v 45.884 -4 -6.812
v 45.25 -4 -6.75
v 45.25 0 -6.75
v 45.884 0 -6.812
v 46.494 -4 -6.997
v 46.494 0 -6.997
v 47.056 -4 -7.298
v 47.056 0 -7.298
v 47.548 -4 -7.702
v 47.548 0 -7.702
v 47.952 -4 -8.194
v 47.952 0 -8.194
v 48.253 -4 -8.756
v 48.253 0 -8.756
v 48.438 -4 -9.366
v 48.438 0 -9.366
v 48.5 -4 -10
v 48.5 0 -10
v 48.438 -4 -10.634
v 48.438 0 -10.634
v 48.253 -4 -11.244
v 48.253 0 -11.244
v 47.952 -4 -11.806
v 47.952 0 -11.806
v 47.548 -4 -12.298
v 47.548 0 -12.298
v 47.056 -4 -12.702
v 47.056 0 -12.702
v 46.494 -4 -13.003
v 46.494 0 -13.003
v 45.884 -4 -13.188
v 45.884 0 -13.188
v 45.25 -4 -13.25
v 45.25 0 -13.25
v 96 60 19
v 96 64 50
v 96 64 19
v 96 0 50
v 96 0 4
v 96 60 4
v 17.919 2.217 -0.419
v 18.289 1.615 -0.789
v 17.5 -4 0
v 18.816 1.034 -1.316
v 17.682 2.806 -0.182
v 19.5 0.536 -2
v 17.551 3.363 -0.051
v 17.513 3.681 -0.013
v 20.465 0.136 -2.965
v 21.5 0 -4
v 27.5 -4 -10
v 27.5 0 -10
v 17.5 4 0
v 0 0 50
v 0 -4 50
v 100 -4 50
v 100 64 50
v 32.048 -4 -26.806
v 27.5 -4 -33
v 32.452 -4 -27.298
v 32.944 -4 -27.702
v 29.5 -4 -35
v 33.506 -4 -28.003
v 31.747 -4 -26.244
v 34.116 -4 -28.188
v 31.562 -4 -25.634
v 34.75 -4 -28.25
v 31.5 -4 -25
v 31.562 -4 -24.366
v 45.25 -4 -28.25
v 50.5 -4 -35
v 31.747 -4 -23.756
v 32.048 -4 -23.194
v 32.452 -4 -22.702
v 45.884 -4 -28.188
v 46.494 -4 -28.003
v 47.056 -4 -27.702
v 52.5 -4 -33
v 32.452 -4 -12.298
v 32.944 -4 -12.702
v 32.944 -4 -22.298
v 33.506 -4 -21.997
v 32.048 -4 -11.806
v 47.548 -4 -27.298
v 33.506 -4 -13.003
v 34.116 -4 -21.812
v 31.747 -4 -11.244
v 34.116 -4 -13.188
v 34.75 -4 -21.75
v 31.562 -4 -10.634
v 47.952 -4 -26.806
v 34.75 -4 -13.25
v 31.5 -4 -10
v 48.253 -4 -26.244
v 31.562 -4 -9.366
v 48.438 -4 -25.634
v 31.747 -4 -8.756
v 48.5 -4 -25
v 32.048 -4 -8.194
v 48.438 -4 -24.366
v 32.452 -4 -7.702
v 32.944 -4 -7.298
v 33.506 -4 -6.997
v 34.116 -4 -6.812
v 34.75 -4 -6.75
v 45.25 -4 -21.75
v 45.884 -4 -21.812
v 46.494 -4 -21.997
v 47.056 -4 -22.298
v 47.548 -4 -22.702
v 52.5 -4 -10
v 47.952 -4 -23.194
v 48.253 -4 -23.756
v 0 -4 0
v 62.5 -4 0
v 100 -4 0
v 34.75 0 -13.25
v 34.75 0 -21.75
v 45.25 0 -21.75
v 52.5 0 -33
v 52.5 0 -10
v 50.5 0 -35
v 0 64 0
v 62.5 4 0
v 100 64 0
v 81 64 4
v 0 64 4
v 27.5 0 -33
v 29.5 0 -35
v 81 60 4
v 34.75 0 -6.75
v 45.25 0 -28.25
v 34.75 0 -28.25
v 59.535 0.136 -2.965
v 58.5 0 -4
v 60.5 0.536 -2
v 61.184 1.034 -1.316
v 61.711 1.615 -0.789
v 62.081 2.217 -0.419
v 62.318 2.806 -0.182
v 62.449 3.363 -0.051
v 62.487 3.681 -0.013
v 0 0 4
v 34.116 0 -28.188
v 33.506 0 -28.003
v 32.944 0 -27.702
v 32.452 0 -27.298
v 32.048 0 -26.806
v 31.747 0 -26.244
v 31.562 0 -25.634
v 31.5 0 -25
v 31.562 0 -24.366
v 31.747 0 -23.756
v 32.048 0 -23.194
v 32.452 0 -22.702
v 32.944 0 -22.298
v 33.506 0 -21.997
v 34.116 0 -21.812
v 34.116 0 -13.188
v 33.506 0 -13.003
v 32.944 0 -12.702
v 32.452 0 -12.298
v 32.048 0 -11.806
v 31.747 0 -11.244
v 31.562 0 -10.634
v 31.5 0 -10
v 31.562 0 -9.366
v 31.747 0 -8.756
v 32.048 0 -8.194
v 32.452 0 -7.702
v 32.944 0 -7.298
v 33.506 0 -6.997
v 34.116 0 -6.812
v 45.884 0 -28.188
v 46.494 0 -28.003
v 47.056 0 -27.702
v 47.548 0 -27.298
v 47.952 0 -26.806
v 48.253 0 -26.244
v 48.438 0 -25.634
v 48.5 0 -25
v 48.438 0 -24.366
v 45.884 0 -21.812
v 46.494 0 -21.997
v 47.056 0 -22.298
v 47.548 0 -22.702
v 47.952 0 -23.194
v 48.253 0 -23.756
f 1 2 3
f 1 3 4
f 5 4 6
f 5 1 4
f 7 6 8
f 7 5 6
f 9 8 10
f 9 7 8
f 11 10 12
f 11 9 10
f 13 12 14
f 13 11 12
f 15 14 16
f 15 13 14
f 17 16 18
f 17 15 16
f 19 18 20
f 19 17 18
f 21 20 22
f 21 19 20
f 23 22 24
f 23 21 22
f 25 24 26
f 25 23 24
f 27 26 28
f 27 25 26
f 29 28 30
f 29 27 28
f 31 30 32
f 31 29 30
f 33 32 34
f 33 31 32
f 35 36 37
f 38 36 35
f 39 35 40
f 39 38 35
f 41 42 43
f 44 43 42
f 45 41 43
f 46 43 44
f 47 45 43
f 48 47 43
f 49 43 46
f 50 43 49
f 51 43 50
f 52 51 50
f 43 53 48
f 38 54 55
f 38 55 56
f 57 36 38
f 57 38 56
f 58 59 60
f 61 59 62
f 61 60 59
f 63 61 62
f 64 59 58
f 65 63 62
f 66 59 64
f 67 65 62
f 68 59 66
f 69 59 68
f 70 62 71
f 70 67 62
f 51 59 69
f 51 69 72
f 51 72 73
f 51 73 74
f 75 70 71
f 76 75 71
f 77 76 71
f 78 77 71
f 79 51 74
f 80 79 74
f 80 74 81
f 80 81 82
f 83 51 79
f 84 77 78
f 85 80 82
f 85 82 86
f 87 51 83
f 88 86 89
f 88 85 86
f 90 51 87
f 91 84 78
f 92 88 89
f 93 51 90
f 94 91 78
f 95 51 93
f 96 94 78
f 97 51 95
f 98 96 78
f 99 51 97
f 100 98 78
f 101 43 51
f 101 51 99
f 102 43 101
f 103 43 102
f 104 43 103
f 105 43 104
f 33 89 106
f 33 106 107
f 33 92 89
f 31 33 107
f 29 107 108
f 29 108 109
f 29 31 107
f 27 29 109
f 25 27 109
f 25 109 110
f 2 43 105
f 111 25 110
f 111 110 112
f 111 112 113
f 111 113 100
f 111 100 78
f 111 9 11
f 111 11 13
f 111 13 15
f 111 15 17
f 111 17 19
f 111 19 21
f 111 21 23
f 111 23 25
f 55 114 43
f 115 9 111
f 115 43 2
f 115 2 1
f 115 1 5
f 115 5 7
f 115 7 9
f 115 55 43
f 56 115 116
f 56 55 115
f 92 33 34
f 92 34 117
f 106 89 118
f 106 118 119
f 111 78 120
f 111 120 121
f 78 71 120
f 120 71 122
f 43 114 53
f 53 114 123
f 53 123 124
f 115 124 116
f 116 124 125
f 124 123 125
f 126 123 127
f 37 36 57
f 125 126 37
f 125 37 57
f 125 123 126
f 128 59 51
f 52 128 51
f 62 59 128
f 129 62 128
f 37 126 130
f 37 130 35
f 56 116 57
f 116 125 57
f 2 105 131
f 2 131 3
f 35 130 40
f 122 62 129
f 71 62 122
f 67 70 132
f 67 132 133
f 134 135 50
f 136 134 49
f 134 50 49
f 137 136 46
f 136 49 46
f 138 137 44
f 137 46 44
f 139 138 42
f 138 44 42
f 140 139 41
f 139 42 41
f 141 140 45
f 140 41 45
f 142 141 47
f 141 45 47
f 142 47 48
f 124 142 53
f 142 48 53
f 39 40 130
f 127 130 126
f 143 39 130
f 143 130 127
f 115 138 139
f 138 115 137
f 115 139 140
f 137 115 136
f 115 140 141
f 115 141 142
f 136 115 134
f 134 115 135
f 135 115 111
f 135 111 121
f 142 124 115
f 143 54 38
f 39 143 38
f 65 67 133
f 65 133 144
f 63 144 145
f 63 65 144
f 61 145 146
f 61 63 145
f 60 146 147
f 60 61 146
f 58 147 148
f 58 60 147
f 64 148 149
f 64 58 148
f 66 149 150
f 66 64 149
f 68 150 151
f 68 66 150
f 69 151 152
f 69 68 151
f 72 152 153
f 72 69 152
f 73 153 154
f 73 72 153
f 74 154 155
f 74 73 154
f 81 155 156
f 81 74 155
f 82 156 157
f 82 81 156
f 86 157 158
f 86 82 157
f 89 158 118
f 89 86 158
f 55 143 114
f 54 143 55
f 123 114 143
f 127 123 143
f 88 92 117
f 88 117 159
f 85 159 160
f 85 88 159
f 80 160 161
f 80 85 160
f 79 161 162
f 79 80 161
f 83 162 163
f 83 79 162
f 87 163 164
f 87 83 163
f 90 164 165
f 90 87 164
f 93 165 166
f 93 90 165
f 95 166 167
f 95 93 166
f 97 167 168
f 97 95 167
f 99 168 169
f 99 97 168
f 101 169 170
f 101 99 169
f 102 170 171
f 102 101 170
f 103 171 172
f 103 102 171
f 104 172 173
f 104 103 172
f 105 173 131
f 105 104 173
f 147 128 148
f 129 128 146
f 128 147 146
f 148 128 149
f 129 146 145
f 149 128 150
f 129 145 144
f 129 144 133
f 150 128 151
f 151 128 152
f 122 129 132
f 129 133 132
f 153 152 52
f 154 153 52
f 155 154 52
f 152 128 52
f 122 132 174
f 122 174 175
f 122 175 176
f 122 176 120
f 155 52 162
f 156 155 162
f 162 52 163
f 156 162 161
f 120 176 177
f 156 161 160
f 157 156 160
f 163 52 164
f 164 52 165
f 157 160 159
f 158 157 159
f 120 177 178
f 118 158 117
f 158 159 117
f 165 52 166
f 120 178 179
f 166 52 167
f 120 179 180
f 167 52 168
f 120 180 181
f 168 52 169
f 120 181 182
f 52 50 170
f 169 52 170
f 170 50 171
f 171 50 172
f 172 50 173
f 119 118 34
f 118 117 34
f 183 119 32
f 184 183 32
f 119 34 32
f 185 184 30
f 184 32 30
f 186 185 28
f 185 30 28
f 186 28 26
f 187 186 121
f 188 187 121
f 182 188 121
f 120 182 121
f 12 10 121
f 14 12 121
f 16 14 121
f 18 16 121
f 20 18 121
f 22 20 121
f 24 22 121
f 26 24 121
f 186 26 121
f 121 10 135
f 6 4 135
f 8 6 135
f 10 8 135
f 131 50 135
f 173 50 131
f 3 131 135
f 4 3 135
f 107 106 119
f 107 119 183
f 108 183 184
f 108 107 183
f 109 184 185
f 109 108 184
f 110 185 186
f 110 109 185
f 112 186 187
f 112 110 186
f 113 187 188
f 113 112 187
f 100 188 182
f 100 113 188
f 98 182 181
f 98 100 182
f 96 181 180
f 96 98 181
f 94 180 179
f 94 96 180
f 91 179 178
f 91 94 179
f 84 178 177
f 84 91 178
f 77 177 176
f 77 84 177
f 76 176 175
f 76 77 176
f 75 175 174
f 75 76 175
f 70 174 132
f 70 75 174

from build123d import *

# Parameters (mm, degrees)
BOSS_EXTRUDE1_DEPTH       = 64
SKETCH2_W                 = 100
SKETCH2_H                 = 50
BOSS_EXTRUDE2_DEPTH       = 4
BOSS_EXTRUDE3_DEPTH       = 4
SKETCH4_W                 = 25
SKETCH4_H                 = 35
BOSS_EXTRUDE4_DEPTH       = 4
CHAMFER1_SIZE             = 10
CHAMFER2_SIZE             = 2
F_6_0MM_START             = -4
F_6_0MM_DOWEL_SLOT1_DEPTH = 4
FILLET1_R                 = 4


# Read off the part's stored shape, not the designer's step: Ø6.0mm Dowel Slot1
with BuildPart() as part:
    # Sketch1 → Boss-Extrude1 (new body)
    with BuildSketch(Plane(origin=(0, 0, 0), x_dir=(1, 0, 0), z_dir=(0, 1, 0))):
        Polygon((0, 0), (100, 0), (100, -50), (96, -50), (96, -4), (0, -4), align=None)
    extrude(amount=BOSS_EXTRUDE1_DEPTH)

    # Sketch2 → Boss-Extrude2 (add)
    with BuildSketch(Plane.XZ):
        with Locations((50, 25)):
            Rectangle(SKETCH2_W, SKETCH2_H)
    extrude(amount=BOSS_EXTRUDE2_DEPTH)

    # Sketch3 → Boss-Extrude3 (add)
    with BuildSketch(Plane(origin=(0, 64, 0), x_dir=(1, 0, 0), z_dir=(0, 1, 0))):
        Polygon((96, -4), (81, -4), (96, -19), align=None)
    extrude(amount=-BOSS_EXTRUDE3_DEPTH)

    # Sketch4 → Boss-Extrude4 (add)
    with BuildSketch(Plane.XZ.offset(4)):
        with Locations((40, -17.5)):
            Rectangle(SKETCH4_W, SKETCH4_H)
    extrude(amount=-BOSS_EXTRUDE4_DEPTH)

    # Chamfer1
    chamfer1_edges = [part.edges().sort_by_distance(p)[0] for p in [
        (52.5, -2, 0),
        (27.5, -2, 0),
    ]]
    chamfer(chamfer1_edges, length=CHAMFER1_SIZE)

    # Chamfer2
    chamfer2_edges = [part.edges().sort_by_distance(p)[0] for p in [
        (52.5, -2, -35),
        (27.5, -2, -35),
    ]]
    chamfer(chamfer2_edges, length=CHAMFER2_SIZE)

    # Ø6.0mm Dowel Slot1 outline → Ø6.0mm Dowel Slot1 (cut)
    with BuildSketch(Plane(origin=(0, 0, 0), x_dir=(1, 0, 0), z_dir=(0, 1, 0)).offset(F_6_0MM_START)):
        with BuildLine():
            Line((34.75, 6.75), (45.25, 6.75))
            ThreePointArc((45.25, 6.75), (48.5, 10), (45.25, 13.25))
            Line((45.25, 13.25), (34.75, 13.25))
            ThreePointArc((34.75, 13.25), (31.5, 10), (34.75, 6.75))
        make_face()
        with BuildLine():
            Line((34.75, 21.75), (45.25, 21.75))
            ThreePointArc((45.25, 21.75), (48.5, 25), (45.25, 28.25))
            Line((45.25, 28.25), (34.75, 28.25))
            ThreePointArc((34.75, 28.25), (31.5, 25), (34.75, 21.75))
        make_face()
    extrude(amount=F_6_0MM_DOWEL_SLOT1_DEPTH, mode=Mode.SUBTRACT)

    # Fillet1
    fillet1_edges = [part.edges().sort_by_distance(p)[0] for p in [
        (40, 0, 0),
    ]]
    fillet(fillet1_edges, radius=FILLET1_R)


solid = part.part
